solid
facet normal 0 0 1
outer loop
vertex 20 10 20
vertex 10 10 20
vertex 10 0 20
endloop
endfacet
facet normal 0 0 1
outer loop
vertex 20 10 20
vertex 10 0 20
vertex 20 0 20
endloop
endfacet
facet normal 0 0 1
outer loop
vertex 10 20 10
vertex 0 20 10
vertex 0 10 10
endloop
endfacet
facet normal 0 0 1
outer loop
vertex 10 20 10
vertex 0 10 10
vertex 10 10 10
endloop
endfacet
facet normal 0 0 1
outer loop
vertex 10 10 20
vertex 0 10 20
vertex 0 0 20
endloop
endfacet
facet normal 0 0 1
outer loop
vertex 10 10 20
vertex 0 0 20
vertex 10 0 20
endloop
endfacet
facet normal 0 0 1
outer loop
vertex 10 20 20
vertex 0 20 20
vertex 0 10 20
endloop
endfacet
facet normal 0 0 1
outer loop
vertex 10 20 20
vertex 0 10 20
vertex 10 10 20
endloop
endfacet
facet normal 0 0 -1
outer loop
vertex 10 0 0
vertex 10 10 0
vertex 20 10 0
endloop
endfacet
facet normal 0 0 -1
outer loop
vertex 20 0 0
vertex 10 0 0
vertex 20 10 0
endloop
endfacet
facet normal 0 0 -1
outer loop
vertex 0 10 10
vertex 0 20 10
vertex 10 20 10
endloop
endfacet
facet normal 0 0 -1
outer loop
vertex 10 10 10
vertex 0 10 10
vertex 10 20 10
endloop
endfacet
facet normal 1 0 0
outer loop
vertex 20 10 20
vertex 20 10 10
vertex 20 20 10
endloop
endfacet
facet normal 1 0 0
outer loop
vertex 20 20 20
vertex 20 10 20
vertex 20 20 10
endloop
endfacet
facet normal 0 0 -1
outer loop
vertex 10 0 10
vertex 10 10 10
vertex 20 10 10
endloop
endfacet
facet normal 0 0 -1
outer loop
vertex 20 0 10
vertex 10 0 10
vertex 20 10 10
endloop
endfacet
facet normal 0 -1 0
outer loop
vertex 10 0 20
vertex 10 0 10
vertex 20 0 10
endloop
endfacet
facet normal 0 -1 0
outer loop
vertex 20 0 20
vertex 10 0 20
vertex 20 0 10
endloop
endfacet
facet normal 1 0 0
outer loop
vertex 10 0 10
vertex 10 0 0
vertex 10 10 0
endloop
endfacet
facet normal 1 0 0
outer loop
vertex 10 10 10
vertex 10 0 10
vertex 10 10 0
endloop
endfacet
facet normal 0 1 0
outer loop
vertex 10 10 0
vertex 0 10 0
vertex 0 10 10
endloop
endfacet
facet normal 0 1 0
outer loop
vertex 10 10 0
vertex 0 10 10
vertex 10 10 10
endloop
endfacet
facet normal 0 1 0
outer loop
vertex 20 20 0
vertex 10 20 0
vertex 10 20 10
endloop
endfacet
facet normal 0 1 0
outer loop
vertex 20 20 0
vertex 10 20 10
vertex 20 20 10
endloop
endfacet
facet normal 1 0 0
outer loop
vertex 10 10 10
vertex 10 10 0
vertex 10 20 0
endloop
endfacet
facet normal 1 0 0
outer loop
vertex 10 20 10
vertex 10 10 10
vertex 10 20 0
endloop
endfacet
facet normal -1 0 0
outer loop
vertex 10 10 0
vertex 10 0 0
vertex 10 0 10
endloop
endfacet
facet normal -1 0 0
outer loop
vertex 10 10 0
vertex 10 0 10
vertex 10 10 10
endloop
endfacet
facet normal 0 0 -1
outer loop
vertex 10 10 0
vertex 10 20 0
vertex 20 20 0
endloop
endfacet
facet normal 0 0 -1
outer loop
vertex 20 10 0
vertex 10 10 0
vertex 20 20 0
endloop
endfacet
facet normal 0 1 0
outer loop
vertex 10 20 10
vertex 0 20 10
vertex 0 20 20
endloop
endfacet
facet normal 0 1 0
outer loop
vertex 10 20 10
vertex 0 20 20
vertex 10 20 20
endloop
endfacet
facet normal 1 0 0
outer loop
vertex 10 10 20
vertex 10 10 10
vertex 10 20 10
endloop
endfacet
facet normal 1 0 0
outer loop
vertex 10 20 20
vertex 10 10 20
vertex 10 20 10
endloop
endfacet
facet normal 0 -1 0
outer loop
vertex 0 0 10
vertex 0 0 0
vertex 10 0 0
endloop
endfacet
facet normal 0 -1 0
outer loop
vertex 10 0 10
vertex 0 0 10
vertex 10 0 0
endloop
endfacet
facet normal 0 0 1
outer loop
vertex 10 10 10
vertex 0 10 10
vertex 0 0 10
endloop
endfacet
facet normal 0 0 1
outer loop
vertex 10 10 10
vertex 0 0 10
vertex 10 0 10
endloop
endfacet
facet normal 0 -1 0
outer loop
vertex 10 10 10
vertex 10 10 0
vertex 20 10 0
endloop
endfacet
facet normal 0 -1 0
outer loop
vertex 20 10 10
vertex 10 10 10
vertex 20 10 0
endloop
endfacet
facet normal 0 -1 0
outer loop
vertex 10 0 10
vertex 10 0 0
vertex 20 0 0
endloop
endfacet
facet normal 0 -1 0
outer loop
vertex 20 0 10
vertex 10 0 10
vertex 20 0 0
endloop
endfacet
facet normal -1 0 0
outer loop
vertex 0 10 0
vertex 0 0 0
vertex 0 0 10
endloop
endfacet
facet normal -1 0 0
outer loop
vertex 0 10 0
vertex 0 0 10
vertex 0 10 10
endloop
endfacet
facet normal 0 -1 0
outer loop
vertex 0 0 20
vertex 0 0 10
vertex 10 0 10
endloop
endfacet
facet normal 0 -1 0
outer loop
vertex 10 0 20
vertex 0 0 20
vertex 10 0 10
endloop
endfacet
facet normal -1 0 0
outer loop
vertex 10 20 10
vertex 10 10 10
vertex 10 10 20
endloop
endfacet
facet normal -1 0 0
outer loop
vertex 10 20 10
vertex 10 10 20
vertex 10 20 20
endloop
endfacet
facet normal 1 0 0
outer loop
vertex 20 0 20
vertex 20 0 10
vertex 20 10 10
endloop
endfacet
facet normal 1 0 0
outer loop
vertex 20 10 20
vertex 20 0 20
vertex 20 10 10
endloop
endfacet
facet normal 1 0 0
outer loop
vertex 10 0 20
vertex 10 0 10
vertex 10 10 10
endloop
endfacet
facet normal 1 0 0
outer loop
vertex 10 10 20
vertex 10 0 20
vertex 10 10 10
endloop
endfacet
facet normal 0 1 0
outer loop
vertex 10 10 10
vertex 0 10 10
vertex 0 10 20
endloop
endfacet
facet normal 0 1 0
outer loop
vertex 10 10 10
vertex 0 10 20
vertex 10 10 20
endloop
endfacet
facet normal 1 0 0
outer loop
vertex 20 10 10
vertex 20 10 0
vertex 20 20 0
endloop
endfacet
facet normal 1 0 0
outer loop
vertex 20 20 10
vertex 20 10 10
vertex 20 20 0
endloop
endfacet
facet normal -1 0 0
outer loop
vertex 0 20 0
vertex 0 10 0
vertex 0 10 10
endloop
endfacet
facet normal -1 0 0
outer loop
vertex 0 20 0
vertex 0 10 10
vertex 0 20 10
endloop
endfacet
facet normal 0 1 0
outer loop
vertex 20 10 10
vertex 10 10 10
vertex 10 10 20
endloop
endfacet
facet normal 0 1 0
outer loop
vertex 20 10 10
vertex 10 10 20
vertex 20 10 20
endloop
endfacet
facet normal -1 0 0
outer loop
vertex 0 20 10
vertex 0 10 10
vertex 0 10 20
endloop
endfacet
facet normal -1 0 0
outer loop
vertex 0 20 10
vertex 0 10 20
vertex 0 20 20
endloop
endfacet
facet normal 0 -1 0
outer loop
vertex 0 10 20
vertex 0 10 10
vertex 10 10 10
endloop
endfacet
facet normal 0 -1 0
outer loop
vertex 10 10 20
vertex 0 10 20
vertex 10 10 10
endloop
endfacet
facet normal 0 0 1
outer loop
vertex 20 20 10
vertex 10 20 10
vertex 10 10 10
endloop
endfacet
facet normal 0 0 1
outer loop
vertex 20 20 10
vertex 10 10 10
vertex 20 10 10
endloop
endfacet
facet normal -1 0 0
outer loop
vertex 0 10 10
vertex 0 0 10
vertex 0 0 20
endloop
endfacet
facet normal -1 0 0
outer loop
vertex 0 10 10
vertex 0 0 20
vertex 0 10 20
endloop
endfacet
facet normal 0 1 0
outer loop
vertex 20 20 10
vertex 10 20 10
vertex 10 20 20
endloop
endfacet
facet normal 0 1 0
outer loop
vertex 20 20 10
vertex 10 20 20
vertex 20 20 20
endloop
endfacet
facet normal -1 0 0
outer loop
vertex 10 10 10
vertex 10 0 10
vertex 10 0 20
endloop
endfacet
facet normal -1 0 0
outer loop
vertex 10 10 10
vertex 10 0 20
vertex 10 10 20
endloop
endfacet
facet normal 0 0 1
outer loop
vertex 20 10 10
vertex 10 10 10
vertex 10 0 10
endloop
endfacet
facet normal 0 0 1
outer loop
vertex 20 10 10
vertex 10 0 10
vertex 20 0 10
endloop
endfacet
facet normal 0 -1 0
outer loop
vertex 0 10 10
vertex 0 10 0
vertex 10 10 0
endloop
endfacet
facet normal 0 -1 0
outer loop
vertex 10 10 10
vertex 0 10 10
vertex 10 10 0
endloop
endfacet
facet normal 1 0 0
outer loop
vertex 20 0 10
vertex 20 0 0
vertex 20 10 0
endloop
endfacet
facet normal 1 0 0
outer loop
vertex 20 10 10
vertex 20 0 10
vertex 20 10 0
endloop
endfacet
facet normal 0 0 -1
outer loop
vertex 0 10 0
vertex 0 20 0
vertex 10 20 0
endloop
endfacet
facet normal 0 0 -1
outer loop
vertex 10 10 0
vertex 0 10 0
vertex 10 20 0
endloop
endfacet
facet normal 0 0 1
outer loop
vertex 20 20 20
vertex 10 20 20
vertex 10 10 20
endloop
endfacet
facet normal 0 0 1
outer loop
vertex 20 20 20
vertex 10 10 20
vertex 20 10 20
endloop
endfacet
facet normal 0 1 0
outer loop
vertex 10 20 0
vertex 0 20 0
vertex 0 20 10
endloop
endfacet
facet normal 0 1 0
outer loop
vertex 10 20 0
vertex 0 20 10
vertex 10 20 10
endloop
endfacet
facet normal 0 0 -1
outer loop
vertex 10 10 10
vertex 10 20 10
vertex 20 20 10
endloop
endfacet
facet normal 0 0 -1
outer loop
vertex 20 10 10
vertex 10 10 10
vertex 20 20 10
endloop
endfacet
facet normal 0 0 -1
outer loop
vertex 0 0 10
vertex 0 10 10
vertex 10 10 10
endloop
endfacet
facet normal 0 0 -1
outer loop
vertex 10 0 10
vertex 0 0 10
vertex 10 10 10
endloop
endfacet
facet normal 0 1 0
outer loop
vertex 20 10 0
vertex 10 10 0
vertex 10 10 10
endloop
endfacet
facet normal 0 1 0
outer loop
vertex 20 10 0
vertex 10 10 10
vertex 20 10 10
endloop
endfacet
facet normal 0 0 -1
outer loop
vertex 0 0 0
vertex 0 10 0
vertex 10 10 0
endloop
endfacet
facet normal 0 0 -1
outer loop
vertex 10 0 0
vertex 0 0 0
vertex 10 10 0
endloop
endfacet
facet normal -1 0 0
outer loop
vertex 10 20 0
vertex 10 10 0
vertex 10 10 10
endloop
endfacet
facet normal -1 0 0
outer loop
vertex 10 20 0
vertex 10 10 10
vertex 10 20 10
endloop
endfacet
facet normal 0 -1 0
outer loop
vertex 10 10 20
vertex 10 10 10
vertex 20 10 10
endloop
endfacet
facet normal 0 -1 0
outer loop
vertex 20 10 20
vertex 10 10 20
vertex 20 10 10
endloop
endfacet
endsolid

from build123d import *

# Parameters (mm, degrees)
BOX_W        = 10
BOX_H        = 10
BOX_DEPTH    = 10
BOX001_W     = 10
BOX001_H     = 10
BOX001_DEPTH = 10
BOX002_W     = 10
BOX002_H     = 10
BOX002_DEPTH = 10
BOX003_W     = 10
BOX003_H     = 10
BOX003_DEPTH = 10
BOX004_W     = 10
BOX004_H     = 10
BOX004_DEPTH = 10
BOX005_W     = 10
BOX005_H     = 10
BOX005_DEPTH = 10
BOX006_W     = 10
BOX006_H     = 10
BOX006_DEPTH = 10
BOX007_W     = 10
BOX007_H     = 10
BOX007_DEPTH = 10


with BuildPart() as cube:
    # Box → Box (new body)
    with BuildSketch(Plane.XY):
        with Locations((5, 5)):
            Rectangle(BOX_W, BOX_H)
    extrude(amount=BOX_DEPTH)


with BuildPart() as cube001:
    # Box001 → Box001 (new body)
    with BuildSketch(Plane(origin=(10, 0, 0), x_dir=(1, 0, 0), z_dir=(0, 0, 1))):
        with Locations((5, 5)):
            Rectangle(BOX001_W, BOX001_H)
    extrude(amount=BOX001_DEPTH)


with BuildPart() as cube002:
    # Box002 → Box002 (new body)
    with BuildSketch(Plane(origin=(10, 10, 0), x_dir=(1, 0, 0), z_dir=(0, 0, 1))):
        with Locations((5, 5)):
            Rectangle(BOX002_W, BOX002_H)
    extrude(amount=BOX002_DEPTH)


with BuildPart() as cube003:
    # Box003 → Box003 (new body)
    with BuildSketch(Plane(origin=(0, 10, 0), x_dir=(1, 0, 0), z_dir=(0, 0, 1))):
        with Locations((5, 5)):
            Rectangle(BOX003_W, BOX003_H)
    extrude(amount=BOX003_DEPTH)


with BuildPart() as cube004:
    # Box004 → Box004 (new body)
    with BuildSketch(Plane.XY.offset(10)):
        with Locations((5, 5)):
            Rectangle(BOX004_W, BOX004_H)
    extrude(amount=BOX004_DEPTH)


with BuildPart() as cube005:
    # Box005 → Box005 (new body)
    with BuildSketch(Plane(origin=(10, 0, 10), x_dir=(1, 0, 0), z_dir=(0, 0, 1))):
        with Locations((5, 5)):
            Rectangle(BOX005_W, BOX005_H)
    extrude(amount=BOX005_DEPTH)


with BuildPart() as cube006:
    # Box006 → Box006 (new body)
    with BuildSketch(Plane(origin=(0, 10, 10), x_dir=(1, 0, 0), z_dir=(0, 0, 1))):
        with Locations((5, 5)):
            Rectangle(BOX006_W, BOX006_H)
    extrude(amount=BOX006_DEPTH)


with BuildPart() as cube007:
    # Box007 → Box007 (new body)
    with BuildSketch(Plane(origin=(10, 10, 10), x_dir=(1, 0, 0), z_dir=(0, 0, 1))):
        with Locations((5, 5)):
            Rectangle(BOX007_W, BOX007_H)
    extrude(amount=BOX007_DEPTH)


solid = Compound([cube.part, cube001.part, cube002.part, cube003.part, cube004.part, cube005.part, cube006.part, cube007.part])
